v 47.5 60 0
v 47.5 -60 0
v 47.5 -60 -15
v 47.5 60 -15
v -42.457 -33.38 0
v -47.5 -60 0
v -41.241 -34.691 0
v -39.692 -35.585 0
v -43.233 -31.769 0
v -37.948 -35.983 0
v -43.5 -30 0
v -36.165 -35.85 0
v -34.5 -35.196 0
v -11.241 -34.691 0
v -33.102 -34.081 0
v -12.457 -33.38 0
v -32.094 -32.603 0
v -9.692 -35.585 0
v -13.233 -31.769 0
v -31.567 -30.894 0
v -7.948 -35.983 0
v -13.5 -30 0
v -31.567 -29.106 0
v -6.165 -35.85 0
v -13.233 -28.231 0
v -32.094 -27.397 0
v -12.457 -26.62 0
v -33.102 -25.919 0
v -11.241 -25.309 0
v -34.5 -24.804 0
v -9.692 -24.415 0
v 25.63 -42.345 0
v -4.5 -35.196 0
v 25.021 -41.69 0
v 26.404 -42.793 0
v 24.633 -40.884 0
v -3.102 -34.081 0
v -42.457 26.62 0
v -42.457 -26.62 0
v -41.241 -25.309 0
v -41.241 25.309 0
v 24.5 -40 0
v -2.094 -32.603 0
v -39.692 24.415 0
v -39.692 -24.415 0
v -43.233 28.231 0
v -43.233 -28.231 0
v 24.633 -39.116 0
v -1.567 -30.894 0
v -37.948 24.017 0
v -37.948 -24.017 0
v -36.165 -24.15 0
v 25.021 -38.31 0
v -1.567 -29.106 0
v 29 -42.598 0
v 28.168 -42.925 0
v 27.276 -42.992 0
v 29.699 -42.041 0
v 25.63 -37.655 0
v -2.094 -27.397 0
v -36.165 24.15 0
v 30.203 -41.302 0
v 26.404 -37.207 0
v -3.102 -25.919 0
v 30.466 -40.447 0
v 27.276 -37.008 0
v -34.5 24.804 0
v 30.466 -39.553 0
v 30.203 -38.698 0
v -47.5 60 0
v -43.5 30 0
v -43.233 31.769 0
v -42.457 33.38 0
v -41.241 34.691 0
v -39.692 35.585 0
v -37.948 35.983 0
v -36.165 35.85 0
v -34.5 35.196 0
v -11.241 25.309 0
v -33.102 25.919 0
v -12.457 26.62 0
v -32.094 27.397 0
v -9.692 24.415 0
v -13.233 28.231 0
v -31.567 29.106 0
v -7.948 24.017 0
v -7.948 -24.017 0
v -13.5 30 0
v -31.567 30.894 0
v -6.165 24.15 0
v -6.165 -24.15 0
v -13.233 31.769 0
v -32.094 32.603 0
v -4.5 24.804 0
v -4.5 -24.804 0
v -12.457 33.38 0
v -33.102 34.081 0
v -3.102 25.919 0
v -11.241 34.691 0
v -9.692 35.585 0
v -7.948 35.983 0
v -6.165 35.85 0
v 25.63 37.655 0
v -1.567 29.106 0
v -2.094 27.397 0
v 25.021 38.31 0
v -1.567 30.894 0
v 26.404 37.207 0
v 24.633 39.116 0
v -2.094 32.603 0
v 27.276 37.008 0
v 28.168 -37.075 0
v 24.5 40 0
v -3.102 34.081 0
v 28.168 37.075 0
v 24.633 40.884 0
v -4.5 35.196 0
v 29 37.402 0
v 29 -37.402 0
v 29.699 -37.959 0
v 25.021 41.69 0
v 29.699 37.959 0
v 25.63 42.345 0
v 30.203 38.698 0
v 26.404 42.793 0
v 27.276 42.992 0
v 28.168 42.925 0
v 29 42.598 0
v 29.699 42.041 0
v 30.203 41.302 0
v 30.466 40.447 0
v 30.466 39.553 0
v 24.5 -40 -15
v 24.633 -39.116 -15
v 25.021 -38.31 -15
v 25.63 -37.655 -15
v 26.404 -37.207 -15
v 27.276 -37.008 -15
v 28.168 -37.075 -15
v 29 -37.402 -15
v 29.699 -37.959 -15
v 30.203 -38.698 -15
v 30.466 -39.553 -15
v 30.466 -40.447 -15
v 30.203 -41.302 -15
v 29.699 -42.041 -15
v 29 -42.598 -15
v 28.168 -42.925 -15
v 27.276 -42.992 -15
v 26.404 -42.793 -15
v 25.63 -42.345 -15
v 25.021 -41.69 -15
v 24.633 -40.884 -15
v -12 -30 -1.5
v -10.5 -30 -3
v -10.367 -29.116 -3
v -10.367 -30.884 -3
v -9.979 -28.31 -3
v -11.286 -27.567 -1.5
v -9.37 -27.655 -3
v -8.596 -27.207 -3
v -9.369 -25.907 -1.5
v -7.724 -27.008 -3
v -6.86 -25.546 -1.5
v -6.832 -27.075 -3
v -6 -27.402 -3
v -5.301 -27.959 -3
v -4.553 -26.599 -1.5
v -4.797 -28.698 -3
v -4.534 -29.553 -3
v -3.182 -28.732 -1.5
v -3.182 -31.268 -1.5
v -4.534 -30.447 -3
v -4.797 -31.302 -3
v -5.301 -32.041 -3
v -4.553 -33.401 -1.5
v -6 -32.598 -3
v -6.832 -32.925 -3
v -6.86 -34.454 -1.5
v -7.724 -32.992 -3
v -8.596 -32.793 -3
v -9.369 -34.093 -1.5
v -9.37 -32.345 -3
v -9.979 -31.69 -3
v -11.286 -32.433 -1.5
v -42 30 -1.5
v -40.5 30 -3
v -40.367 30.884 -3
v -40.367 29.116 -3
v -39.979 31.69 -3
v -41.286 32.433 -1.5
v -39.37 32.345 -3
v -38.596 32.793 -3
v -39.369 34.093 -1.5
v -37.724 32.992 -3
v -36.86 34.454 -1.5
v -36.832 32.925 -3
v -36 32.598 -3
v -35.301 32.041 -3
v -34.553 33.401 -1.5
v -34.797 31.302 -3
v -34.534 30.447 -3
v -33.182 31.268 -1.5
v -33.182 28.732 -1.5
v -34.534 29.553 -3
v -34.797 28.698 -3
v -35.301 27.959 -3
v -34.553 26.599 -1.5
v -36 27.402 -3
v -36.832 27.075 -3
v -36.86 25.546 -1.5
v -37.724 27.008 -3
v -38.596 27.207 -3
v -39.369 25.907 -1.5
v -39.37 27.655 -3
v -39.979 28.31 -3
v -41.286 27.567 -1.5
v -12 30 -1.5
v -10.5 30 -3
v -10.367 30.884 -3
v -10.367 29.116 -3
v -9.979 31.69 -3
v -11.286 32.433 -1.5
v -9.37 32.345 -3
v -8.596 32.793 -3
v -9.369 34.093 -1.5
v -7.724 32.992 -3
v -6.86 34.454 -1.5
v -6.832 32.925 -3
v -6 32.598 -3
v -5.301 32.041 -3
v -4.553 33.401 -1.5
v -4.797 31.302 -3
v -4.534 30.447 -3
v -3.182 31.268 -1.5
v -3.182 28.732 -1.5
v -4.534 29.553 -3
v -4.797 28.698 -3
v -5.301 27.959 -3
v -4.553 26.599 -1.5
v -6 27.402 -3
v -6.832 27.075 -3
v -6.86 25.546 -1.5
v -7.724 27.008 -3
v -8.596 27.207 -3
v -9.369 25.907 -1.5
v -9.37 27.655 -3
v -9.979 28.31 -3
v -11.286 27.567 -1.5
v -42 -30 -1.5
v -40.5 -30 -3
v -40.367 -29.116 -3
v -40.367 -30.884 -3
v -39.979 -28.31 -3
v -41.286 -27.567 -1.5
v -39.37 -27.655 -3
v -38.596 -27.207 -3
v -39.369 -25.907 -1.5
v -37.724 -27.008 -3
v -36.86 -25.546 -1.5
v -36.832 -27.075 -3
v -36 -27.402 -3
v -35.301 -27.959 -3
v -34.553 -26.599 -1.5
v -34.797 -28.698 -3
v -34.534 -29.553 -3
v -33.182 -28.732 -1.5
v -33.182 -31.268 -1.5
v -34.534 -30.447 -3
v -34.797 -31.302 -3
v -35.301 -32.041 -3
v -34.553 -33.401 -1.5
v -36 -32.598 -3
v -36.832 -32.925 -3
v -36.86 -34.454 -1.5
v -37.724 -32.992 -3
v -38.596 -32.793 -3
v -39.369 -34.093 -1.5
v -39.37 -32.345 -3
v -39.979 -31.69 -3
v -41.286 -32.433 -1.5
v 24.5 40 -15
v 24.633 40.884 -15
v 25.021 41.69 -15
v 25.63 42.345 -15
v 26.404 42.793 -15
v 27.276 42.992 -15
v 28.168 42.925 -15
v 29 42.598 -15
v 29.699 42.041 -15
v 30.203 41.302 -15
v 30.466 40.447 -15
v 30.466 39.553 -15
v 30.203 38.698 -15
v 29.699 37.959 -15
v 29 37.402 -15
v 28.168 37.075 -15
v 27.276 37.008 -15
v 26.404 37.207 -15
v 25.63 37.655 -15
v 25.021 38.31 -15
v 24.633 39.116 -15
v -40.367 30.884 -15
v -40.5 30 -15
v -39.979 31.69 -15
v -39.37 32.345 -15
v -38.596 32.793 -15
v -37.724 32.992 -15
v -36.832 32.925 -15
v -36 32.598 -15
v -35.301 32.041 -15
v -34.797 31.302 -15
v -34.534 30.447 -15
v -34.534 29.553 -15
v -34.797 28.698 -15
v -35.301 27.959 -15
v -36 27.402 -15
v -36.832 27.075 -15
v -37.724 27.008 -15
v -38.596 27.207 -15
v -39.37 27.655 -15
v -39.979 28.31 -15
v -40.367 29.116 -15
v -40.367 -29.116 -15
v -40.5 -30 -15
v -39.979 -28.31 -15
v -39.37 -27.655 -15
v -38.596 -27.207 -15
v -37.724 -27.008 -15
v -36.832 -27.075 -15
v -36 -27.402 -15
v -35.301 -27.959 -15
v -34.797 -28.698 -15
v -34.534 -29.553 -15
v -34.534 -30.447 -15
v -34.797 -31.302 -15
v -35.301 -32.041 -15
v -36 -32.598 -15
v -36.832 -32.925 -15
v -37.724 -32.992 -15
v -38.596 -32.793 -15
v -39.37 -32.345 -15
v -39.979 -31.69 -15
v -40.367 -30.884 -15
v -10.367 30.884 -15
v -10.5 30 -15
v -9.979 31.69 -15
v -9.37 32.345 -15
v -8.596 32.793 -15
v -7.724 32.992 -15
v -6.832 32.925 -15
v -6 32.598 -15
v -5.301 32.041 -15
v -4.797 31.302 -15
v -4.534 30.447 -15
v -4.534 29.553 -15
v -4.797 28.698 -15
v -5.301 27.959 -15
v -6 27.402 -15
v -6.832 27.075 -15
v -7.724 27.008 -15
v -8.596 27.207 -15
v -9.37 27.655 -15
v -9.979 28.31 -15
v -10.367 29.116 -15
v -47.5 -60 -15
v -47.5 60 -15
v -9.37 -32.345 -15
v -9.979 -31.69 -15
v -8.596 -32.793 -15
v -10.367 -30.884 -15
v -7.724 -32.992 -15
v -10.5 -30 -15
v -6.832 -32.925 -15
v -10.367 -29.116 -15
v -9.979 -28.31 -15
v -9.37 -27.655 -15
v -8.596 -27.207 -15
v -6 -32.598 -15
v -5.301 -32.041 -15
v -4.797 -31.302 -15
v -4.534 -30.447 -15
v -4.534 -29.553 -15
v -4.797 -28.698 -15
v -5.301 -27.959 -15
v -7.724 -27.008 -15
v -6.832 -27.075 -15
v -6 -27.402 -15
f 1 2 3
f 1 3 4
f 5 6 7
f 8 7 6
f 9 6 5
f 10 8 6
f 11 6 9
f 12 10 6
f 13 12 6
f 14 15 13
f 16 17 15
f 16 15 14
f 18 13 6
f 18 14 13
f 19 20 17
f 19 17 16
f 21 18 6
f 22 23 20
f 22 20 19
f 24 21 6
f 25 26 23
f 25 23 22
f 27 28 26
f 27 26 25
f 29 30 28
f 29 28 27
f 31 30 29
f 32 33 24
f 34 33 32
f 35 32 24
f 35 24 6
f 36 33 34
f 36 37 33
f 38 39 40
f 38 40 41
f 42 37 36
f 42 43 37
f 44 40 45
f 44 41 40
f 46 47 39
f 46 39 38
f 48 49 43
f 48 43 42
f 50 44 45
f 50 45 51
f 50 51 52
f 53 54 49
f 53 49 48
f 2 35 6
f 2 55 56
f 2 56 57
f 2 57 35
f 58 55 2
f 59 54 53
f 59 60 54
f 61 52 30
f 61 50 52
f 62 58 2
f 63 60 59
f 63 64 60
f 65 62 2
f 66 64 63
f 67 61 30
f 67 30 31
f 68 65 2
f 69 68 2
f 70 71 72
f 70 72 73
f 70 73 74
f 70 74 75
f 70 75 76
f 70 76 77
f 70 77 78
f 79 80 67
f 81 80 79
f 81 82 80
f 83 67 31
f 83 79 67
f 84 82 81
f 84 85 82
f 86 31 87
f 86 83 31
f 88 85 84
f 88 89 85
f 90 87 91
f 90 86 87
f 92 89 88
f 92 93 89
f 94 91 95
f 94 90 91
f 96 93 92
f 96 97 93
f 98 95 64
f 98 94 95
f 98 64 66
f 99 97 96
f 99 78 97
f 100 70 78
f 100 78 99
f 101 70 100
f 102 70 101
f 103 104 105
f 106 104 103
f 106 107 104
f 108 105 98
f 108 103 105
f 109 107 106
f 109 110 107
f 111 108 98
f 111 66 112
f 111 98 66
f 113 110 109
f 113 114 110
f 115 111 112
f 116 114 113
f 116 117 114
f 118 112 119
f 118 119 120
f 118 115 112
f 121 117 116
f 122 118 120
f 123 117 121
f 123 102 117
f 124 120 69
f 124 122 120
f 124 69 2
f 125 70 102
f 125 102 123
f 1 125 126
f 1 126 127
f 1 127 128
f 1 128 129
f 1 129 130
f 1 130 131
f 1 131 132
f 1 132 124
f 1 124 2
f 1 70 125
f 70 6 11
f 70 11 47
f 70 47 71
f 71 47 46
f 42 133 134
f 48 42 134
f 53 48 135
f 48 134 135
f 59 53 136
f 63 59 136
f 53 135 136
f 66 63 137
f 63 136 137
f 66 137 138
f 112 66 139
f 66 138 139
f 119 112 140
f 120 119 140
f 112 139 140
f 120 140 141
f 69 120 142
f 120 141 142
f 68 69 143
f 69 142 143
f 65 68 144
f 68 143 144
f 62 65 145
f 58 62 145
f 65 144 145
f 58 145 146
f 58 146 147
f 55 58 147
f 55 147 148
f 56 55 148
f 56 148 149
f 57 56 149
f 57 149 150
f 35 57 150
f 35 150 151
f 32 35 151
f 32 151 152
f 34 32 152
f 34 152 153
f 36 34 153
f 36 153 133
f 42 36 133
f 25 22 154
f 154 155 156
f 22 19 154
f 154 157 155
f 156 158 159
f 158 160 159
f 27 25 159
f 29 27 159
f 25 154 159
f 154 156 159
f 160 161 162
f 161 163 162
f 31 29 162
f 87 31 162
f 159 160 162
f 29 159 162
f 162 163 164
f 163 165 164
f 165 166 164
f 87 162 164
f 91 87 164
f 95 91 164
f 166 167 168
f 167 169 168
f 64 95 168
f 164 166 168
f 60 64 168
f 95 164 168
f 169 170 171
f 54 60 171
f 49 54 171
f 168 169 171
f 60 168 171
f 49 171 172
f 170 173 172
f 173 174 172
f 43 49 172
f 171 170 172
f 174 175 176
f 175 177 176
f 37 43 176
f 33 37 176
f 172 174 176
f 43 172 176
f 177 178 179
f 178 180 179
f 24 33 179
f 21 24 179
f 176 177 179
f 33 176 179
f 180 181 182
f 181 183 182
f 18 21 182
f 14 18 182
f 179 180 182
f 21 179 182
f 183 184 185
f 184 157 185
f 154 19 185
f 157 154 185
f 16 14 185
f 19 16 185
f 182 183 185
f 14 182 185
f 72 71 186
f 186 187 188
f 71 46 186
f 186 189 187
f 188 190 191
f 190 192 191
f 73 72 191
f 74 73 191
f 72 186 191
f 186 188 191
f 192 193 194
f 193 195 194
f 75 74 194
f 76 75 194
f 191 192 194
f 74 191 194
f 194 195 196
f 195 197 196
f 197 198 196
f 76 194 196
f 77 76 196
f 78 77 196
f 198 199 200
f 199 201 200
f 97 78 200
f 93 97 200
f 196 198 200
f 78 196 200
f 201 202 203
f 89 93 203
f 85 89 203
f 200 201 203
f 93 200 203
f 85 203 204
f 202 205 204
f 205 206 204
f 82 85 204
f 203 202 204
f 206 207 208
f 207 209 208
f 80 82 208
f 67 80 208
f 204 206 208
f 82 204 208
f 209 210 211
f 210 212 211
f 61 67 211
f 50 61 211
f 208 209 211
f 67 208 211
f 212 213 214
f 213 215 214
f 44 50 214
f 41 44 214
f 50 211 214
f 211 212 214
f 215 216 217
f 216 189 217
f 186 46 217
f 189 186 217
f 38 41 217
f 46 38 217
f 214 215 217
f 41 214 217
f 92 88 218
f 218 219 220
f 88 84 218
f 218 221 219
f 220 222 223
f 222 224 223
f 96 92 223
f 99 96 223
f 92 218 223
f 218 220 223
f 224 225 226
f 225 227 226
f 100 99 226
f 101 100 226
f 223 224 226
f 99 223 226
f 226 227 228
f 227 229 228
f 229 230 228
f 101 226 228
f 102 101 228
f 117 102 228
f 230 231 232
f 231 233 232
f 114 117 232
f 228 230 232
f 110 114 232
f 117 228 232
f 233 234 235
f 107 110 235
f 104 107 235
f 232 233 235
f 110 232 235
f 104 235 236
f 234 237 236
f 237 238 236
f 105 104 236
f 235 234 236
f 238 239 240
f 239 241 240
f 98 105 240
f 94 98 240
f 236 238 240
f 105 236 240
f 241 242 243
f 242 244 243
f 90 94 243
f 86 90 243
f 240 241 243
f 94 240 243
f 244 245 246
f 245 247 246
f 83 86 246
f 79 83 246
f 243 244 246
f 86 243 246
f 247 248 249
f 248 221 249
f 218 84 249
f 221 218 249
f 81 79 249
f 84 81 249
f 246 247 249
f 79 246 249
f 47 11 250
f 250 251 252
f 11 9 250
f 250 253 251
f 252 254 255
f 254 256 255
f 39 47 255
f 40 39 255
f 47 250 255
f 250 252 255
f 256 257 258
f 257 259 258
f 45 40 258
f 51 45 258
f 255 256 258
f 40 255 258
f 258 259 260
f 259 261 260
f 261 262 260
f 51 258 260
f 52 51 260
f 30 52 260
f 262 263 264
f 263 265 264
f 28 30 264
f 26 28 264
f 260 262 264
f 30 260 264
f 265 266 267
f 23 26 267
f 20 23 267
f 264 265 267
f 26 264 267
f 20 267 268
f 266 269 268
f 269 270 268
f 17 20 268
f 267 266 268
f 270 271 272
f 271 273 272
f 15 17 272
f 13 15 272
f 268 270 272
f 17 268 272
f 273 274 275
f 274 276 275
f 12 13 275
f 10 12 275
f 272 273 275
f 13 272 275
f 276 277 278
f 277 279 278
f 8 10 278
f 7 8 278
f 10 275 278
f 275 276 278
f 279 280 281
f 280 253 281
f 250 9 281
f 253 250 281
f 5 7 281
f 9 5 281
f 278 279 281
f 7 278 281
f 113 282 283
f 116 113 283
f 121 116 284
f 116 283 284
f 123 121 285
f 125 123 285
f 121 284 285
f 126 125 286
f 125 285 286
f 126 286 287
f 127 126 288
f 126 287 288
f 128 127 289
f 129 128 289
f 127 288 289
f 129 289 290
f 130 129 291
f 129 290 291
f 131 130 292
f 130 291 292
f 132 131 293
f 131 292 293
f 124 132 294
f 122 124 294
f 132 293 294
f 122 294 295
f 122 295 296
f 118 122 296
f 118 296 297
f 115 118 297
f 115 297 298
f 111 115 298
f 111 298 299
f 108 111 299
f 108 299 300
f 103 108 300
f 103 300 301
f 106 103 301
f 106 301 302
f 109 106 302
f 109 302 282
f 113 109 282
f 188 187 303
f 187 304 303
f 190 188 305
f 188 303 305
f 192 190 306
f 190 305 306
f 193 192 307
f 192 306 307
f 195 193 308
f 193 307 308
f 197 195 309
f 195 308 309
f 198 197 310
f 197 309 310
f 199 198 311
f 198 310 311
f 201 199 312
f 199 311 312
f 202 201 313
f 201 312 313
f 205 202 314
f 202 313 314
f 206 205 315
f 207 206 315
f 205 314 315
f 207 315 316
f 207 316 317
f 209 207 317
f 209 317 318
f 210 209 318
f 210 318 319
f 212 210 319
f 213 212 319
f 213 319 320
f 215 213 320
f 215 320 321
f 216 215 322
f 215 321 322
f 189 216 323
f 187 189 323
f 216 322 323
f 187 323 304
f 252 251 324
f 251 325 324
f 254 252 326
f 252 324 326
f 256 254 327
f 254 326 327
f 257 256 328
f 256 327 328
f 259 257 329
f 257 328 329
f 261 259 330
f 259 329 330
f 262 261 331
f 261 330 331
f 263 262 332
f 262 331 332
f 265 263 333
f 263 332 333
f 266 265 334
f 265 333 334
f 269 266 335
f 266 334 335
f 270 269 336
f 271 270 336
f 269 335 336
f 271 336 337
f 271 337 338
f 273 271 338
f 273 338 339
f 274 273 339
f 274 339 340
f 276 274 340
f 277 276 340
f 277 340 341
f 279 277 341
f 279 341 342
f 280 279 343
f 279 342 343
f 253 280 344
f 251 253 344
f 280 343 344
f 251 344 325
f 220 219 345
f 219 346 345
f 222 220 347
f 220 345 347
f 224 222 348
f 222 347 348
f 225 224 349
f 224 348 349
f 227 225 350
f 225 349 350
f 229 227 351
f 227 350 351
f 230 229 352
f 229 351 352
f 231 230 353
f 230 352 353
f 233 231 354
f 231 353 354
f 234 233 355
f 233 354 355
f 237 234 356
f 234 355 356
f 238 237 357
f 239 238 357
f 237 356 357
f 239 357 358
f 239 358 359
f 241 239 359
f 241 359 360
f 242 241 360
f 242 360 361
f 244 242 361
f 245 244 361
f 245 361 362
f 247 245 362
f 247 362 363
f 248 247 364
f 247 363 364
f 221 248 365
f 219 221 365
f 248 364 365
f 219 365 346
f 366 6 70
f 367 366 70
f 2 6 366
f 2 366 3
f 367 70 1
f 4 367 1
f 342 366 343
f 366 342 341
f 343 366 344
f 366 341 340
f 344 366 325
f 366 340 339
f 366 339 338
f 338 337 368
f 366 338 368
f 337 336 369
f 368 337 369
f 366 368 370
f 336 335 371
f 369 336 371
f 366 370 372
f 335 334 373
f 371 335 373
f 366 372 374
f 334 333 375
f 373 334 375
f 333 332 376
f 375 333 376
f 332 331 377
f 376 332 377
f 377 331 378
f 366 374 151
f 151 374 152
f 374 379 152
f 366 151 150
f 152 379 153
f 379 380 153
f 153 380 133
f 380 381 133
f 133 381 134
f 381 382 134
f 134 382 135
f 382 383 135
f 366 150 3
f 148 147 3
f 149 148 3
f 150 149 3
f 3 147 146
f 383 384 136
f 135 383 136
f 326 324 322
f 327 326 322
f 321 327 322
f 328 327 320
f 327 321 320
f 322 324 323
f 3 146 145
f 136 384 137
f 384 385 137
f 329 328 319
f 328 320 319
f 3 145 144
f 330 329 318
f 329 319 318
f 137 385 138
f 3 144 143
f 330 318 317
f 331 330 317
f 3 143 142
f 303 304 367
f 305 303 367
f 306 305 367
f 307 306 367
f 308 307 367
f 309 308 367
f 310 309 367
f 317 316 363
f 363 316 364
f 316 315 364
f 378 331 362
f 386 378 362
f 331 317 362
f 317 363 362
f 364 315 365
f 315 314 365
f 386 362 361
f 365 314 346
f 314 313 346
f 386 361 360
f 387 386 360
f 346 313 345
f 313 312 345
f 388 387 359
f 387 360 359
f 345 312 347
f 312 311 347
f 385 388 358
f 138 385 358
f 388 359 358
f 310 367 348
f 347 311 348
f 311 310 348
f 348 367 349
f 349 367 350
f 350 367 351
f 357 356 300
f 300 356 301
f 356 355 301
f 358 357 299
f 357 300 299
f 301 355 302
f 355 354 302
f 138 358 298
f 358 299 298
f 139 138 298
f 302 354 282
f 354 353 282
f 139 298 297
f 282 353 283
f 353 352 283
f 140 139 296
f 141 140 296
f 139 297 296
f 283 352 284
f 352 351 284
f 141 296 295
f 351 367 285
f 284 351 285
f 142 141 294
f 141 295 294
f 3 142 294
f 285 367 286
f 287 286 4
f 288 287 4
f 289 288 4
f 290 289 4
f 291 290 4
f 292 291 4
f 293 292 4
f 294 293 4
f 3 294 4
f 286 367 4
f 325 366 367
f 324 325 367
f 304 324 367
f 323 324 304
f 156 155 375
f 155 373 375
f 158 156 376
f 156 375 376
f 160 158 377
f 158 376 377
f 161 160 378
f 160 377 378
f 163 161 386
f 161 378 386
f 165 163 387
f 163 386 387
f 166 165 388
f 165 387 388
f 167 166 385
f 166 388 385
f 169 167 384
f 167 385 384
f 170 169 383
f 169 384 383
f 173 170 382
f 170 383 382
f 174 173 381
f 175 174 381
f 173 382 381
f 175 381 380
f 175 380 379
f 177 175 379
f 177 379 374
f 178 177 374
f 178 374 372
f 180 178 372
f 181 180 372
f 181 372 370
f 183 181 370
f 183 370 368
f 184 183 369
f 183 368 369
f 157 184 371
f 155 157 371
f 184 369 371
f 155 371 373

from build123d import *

# Parameters (mm, degrees)
F0_W           = 95
F0_H           = 120
F0_R           = 3
F1_DEPTH       = 15
F2_D           = 6
F2_CSINK_D     = 12
F2_CSINK_ANGLE = 90
F3_D           = 6


with BuildPart() as f1:
    # F0 (on Top) → F1 (new body)
    with BuildSketch(Plane.XY):
        Rectangle(F0_W, F0_H)
        with Locations((-37.5, -30)):
            Circle(F0_R, mode=Mode.SUBTRACT)
        with Locations((-7.5, -30)):
            Circle(F0_R, mode=Mode.SUBTRACT)
        with Locations((27.5, -40)):
            Circle(F0_R, mode=Mode.SUBTRACT)
        with Locations((-37.5, 30)):
            Circle(F0_R, mode=Mode.SUBTRACT)
        with Locations((-7.5, 30)):
            Circle(F0_R, mode=Mode.SUBTRACT)
        with Locations((27.5, 40)):
            Circle(F0_R, mode=Mode.SUBTRACT)
        with Locations((-37.5, 30)):
            Circle(F0_R)
        with Locations((-37.5, -30)):
            Circle(F0_R)
        with Locations((-7.5, -30)):
            Circle(F0_R)
        with Locations((27.5, -40)):
            Circle(F0_R)
        with Locations((-7.5, 30)):
            Circle(F0_R)
        with Locations((27.5, 40)):
            Circle(F0_R)
    extrude(amount=-F1_DEPTH)

    # F2 (through all)
    with Locations(Plane.XY):
        with Locations((-37.5, 30), (-7.5, 30), (-37.5, -30), (-7.5, -30)):
            CounterSinkHole(F2_D / 2, F2_CSINK_D / 2, counter_sink_angle=F2_CSINK_ANGLE)

    # F3 (through all)
    with Locations(Plane.XY):
        with Locations((27.5, 40), (27.5, -40)):
            Hole(F3_D / 2)


solid = f1.part
